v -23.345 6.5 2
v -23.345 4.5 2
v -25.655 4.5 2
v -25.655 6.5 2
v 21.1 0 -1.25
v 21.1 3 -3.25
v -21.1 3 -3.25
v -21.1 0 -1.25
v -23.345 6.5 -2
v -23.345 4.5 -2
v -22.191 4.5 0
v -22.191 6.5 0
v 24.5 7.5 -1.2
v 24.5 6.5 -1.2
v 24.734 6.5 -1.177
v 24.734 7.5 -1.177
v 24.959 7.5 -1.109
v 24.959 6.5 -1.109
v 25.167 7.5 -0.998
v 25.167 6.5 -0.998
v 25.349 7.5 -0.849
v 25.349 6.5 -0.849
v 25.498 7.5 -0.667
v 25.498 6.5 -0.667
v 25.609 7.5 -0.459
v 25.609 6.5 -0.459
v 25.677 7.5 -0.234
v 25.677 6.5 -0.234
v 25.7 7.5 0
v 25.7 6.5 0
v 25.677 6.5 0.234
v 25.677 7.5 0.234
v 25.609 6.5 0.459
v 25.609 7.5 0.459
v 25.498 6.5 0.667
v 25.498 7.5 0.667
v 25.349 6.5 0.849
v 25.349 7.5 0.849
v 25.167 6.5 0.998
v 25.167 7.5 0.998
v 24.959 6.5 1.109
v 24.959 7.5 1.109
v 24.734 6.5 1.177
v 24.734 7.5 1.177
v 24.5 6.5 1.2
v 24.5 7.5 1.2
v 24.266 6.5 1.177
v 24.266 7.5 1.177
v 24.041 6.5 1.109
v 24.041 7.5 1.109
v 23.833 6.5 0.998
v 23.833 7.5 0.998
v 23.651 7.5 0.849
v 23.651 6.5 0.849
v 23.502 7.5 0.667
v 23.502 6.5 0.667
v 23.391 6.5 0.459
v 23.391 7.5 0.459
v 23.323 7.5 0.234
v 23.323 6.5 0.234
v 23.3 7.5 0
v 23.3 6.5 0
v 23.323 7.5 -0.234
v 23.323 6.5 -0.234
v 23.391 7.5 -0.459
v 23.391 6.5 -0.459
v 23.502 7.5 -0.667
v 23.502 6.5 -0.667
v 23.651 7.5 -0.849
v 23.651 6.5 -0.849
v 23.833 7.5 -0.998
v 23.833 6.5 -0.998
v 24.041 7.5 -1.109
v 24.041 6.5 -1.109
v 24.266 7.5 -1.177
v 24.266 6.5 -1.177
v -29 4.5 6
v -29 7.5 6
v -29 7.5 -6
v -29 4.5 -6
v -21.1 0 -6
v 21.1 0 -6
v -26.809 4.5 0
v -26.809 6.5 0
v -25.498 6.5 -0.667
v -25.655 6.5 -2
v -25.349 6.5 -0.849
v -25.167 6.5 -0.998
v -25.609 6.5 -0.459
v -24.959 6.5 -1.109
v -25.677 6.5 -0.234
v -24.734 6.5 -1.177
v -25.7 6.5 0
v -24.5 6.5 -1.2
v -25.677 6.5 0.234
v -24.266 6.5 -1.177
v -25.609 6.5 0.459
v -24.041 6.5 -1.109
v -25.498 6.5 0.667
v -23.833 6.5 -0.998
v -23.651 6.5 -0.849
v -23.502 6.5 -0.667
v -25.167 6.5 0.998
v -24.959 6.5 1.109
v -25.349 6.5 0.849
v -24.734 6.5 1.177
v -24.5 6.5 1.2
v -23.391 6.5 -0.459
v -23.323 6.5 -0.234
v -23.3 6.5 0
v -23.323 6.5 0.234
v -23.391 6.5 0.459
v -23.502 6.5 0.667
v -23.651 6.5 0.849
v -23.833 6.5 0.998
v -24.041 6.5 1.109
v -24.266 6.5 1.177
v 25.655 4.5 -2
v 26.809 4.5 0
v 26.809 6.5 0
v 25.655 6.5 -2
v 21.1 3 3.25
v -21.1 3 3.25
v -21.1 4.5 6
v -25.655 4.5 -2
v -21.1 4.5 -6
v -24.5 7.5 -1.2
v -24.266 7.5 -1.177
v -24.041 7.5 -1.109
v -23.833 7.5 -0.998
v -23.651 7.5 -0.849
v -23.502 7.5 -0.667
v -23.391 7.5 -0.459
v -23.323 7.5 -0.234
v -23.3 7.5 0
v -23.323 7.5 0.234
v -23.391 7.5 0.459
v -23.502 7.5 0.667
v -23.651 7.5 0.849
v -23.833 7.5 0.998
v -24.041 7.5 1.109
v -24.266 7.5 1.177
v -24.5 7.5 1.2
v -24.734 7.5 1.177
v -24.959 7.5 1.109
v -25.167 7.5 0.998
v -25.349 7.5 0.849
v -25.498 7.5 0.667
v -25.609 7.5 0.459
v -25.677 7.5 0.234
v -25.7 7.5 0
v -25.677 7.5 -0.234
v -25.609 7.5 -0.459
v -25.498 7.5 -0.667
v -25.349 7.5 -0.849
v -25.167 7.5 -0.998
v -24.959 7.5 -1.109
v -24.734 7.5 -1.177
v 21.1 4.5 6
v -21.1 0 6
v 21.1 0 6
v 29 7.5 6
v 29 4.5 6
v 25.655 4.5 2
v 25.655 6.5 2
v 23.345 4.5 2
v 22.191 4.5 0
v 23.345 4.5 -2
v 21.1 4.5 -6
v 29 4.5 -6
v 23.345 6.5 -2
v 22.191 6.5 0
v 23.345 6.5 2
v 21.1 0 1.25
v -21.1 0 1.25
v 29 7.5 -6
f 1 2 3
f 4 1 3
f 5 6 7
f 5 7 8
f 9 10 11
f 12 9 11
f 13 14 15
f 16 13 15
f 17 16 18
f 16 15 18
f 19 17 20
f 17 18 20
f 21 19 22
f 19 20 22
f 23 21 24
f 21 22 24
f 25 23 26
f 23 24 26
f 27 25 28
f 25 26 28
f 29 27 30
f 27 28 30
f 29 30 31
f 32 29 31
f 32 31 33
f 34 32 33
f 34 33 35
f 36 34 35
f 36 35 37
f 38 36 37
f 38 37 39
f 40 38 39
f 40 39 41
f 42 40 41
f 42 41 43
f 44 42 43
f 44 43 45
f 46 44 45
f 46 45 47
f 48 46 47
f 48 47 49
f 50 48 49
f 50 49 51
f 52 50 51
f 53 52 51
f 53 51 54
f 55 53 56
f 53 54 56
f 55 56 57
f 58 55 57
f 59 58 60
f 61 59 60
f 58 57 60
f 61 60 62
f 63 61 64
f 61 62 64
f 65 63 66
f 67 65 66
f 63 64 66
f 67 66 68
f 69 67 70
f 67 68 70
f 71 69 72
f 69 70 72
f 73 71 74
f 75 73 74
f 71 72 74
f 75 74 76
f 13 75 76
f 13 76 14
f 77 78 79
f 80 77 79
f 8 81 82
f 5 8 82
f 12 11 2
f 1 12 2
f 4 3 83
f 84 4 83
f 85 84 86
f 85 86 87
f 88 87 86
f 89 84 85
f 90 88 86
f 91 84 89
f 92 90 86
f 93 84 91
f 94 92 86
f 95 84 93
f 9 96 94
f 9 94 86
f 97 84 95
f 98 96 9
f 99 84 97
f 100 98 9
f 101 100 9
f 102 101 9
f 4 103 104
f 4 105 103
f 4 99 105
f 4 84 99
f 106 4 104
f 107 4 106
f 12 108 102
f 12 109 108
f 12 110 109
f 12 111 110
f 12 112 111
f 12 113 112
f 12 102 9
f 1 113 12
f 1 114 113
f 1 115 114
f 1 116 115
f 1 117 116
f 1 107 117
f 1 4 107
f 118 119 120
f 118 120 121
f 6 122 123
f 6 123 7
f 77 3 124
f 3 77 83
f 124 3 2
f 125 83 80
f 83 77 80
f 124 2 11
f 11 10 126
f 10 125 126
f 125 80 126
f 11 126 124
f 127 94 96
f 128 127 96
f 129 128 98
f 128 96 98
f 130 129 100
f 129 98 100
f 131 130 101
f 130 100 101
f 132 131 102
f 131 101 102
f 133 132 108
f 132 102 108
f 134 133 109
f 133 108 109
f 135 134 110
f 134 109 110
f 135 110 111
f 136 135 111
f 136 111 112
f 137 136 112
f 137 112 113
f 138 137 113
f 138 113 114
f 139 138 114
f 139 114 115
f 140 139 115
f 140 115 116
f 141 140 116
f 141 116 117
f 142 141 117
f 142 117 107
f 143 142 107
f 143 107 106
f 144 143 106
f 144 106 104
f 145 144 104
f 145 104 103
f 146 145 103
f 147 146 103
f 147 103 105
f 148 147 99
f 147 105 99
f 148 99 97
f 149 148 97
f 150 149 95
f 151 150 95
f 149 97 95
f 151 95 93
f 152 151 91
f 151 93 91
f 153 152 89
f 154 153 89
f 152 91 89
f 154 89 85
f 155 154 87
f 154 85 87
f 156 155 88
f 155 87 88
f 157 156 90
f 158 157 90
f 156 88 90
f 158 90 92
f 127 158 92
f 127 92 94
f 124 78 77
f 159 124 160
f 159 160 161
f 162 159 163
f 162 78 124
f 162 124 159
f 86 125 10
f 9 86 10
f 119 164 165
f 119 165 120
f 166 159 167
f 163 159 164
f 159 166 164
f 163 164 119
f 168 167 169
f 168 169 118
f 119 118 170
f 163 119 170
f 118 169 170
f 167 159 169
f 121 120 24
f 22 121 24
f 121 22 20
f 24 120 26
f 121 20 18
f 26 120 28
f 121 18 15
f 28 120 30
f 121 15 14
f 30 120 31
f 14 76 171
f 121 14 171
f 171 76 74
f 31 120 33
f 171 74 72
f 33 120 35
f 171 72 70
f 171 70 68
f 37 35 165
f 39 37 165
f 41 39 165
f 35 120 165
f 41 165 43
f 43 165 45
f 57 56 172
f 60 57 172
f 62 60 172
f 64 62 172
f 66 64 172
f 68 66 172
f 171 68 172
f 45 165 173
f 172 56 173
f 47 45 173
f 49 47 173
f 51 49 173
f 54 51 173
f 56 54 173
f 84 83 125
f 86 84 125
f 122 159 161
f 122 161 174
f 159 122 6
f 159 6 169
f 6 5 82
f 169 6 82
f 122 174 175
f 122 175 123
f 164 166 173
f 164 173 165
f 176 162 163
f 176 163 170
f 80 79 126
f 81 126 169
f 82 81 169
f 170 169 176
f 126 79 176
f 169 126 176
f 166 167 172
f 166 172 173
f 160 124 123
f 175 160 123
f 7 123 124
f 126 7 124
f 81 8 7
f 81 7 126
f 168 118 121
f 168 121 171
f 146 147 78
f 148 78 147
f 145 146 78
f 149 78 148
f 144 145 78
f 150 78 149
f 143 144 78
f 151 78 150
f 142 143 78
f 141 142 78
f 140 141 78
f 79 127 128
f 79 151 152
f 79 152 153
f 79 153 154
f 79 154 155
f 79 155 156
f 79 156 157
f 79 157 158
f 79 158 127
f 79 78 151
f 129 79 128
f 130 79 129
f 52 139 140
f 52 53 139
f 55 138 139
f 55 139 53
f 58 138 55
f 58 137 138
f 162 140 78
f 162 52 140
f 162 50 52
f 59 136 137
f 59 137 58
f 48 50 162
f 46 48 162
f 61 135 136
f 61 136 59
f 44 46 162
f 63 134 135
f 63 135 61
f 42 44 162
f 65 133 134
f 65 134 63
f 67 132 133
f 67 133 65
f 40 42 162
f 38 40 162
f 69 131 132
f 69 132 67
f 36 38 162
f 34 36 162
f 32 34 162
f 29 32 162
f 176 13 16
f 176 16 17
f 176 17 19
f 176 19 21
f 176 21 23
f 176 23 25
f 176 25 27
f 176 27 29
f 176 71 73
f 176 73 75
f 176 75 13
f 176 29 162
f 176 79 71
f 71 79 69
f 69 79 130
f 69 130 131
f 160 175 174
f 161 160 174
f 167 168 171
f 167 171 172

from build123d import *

# Parameters (mm, degrees)
SKETCH_1_W          = 42.2
SKETCH_1_H          = 12
EXTRUDE_1_DEPTH     = 6
CUT_EXTRUDE_1_DEPTH = 44.044628004
SKETCH_3_W          = 58
SKETCH_3_H          = 12
EXTRUDE_2_DEPTH     = 1.5
CUT_EXTRUDE_2_DEPTH = 2
CUT_EXTRUDE_3_REACH = 32.319
SKETCH_5_R          = 1.2


with BuildPart() as part:
    # 草图1 → 凸台-拉伸1 (new body)
    with BuildSketch(Plane(origin=(0, 0, 0), x_dir=(1, 0, 0), z_dir=(0, 1, 0))):
        Rectangle(SKETCH_1_W, SKETCH_1_H)
    extrude(amount=EXTRUDE_1_DEPTH)

    # 草图2 → 切除-拉伸1 (cut, through all)
    with BuildSketch(Plane(origin=(21.1, 0, 0), x_dir=(0, 0, -1), z_dir=(1, 0, 0))):
        Polygon((3.25, 3), (1.25, 0), (-1.25, 0), (-3.25, 3), align=None)
    extrude(amount=-CUT_EXTRUDE_1_DEPTH, mode=Mode.SUBTRACT)

    # 草图3 → 凸台-拉伸2 (add, symmetric)
    with BuildSketch(Plane(origin=(0, 6, 0), x_dir=(1, 0, 0), z_dir=(0, 1, 0))):
        Rectangle(SKETCH_3_W, SKETCH_3_H)
    extrude(amount=EXTRUDE_2_DEPTH, both=True)

    # 草图4 → 切除-拉伸2 (cut)
    with BuildSketch(Plane.XZ.offset(-4.5)):
        Polygon((-22.190598923, 0), (-23.345299462, 2), (-25.654700538, 2), (-26.809401077, 0), (-25.654700538, -2), (-23.345299462, -2), align=None)
        Polygon((22.190598923, 0), (23.345299462, 2), (25.654700538, 2), (26.809401077, 0), (25.654700538, -2), (23.345299462, -2), align=None)
    extrude(amount=-CUT_EXTRUDE_2_DEPTH, mode=Mode.SUBTRACT)

    # 草图5 → 切除-拉伸3 (cut, up to next)
    with BuildSketch(Plane.XZ.offset(-6.5), mode=Mode.PRIVATE) as cut_extrude_3_sk1:
        with Locations(Location((-24.5, 0, 0), (0, 0, 270))):
            Circle(SKETCH_5_R)
    cut_extrude_3_tool1 = extrude(cut_extrude_3_sk1.sketch, amount=-CUT_EXTRUDE_3_REACH, mode=Mode.PRIVATE) & part.part
    # 草图5 → 切除-拉伸3 (cut, up to next)
    with BuildSketch(Plane.XZ.offset(-6.5), mode=Mode.PRIVATE) as cut_extrude_3_sk2:
        with Locations(Location((24.5, 0, 0), (0, 0, 270))):
            Circle(SKETCH_5_R)
    cut_extrude_3_tool2 = extrude(cut_extrude_3_sk2.sketch, amount=-CUT_EXTRUDE_3_REACH, mode=Mode.PRIVATE) & part.part
    add(cut_extrude_3_tool1.solids().sort_by_distance((-24.5, 6.5, 0))[0], mode=Mode.SUBTRACT)
    add(cut_extrude_3_tool2.solids().sort_by_distance((24.5, 6.5, 0))[0], mode=Mode.SUBTRACT)


solid = part.part
